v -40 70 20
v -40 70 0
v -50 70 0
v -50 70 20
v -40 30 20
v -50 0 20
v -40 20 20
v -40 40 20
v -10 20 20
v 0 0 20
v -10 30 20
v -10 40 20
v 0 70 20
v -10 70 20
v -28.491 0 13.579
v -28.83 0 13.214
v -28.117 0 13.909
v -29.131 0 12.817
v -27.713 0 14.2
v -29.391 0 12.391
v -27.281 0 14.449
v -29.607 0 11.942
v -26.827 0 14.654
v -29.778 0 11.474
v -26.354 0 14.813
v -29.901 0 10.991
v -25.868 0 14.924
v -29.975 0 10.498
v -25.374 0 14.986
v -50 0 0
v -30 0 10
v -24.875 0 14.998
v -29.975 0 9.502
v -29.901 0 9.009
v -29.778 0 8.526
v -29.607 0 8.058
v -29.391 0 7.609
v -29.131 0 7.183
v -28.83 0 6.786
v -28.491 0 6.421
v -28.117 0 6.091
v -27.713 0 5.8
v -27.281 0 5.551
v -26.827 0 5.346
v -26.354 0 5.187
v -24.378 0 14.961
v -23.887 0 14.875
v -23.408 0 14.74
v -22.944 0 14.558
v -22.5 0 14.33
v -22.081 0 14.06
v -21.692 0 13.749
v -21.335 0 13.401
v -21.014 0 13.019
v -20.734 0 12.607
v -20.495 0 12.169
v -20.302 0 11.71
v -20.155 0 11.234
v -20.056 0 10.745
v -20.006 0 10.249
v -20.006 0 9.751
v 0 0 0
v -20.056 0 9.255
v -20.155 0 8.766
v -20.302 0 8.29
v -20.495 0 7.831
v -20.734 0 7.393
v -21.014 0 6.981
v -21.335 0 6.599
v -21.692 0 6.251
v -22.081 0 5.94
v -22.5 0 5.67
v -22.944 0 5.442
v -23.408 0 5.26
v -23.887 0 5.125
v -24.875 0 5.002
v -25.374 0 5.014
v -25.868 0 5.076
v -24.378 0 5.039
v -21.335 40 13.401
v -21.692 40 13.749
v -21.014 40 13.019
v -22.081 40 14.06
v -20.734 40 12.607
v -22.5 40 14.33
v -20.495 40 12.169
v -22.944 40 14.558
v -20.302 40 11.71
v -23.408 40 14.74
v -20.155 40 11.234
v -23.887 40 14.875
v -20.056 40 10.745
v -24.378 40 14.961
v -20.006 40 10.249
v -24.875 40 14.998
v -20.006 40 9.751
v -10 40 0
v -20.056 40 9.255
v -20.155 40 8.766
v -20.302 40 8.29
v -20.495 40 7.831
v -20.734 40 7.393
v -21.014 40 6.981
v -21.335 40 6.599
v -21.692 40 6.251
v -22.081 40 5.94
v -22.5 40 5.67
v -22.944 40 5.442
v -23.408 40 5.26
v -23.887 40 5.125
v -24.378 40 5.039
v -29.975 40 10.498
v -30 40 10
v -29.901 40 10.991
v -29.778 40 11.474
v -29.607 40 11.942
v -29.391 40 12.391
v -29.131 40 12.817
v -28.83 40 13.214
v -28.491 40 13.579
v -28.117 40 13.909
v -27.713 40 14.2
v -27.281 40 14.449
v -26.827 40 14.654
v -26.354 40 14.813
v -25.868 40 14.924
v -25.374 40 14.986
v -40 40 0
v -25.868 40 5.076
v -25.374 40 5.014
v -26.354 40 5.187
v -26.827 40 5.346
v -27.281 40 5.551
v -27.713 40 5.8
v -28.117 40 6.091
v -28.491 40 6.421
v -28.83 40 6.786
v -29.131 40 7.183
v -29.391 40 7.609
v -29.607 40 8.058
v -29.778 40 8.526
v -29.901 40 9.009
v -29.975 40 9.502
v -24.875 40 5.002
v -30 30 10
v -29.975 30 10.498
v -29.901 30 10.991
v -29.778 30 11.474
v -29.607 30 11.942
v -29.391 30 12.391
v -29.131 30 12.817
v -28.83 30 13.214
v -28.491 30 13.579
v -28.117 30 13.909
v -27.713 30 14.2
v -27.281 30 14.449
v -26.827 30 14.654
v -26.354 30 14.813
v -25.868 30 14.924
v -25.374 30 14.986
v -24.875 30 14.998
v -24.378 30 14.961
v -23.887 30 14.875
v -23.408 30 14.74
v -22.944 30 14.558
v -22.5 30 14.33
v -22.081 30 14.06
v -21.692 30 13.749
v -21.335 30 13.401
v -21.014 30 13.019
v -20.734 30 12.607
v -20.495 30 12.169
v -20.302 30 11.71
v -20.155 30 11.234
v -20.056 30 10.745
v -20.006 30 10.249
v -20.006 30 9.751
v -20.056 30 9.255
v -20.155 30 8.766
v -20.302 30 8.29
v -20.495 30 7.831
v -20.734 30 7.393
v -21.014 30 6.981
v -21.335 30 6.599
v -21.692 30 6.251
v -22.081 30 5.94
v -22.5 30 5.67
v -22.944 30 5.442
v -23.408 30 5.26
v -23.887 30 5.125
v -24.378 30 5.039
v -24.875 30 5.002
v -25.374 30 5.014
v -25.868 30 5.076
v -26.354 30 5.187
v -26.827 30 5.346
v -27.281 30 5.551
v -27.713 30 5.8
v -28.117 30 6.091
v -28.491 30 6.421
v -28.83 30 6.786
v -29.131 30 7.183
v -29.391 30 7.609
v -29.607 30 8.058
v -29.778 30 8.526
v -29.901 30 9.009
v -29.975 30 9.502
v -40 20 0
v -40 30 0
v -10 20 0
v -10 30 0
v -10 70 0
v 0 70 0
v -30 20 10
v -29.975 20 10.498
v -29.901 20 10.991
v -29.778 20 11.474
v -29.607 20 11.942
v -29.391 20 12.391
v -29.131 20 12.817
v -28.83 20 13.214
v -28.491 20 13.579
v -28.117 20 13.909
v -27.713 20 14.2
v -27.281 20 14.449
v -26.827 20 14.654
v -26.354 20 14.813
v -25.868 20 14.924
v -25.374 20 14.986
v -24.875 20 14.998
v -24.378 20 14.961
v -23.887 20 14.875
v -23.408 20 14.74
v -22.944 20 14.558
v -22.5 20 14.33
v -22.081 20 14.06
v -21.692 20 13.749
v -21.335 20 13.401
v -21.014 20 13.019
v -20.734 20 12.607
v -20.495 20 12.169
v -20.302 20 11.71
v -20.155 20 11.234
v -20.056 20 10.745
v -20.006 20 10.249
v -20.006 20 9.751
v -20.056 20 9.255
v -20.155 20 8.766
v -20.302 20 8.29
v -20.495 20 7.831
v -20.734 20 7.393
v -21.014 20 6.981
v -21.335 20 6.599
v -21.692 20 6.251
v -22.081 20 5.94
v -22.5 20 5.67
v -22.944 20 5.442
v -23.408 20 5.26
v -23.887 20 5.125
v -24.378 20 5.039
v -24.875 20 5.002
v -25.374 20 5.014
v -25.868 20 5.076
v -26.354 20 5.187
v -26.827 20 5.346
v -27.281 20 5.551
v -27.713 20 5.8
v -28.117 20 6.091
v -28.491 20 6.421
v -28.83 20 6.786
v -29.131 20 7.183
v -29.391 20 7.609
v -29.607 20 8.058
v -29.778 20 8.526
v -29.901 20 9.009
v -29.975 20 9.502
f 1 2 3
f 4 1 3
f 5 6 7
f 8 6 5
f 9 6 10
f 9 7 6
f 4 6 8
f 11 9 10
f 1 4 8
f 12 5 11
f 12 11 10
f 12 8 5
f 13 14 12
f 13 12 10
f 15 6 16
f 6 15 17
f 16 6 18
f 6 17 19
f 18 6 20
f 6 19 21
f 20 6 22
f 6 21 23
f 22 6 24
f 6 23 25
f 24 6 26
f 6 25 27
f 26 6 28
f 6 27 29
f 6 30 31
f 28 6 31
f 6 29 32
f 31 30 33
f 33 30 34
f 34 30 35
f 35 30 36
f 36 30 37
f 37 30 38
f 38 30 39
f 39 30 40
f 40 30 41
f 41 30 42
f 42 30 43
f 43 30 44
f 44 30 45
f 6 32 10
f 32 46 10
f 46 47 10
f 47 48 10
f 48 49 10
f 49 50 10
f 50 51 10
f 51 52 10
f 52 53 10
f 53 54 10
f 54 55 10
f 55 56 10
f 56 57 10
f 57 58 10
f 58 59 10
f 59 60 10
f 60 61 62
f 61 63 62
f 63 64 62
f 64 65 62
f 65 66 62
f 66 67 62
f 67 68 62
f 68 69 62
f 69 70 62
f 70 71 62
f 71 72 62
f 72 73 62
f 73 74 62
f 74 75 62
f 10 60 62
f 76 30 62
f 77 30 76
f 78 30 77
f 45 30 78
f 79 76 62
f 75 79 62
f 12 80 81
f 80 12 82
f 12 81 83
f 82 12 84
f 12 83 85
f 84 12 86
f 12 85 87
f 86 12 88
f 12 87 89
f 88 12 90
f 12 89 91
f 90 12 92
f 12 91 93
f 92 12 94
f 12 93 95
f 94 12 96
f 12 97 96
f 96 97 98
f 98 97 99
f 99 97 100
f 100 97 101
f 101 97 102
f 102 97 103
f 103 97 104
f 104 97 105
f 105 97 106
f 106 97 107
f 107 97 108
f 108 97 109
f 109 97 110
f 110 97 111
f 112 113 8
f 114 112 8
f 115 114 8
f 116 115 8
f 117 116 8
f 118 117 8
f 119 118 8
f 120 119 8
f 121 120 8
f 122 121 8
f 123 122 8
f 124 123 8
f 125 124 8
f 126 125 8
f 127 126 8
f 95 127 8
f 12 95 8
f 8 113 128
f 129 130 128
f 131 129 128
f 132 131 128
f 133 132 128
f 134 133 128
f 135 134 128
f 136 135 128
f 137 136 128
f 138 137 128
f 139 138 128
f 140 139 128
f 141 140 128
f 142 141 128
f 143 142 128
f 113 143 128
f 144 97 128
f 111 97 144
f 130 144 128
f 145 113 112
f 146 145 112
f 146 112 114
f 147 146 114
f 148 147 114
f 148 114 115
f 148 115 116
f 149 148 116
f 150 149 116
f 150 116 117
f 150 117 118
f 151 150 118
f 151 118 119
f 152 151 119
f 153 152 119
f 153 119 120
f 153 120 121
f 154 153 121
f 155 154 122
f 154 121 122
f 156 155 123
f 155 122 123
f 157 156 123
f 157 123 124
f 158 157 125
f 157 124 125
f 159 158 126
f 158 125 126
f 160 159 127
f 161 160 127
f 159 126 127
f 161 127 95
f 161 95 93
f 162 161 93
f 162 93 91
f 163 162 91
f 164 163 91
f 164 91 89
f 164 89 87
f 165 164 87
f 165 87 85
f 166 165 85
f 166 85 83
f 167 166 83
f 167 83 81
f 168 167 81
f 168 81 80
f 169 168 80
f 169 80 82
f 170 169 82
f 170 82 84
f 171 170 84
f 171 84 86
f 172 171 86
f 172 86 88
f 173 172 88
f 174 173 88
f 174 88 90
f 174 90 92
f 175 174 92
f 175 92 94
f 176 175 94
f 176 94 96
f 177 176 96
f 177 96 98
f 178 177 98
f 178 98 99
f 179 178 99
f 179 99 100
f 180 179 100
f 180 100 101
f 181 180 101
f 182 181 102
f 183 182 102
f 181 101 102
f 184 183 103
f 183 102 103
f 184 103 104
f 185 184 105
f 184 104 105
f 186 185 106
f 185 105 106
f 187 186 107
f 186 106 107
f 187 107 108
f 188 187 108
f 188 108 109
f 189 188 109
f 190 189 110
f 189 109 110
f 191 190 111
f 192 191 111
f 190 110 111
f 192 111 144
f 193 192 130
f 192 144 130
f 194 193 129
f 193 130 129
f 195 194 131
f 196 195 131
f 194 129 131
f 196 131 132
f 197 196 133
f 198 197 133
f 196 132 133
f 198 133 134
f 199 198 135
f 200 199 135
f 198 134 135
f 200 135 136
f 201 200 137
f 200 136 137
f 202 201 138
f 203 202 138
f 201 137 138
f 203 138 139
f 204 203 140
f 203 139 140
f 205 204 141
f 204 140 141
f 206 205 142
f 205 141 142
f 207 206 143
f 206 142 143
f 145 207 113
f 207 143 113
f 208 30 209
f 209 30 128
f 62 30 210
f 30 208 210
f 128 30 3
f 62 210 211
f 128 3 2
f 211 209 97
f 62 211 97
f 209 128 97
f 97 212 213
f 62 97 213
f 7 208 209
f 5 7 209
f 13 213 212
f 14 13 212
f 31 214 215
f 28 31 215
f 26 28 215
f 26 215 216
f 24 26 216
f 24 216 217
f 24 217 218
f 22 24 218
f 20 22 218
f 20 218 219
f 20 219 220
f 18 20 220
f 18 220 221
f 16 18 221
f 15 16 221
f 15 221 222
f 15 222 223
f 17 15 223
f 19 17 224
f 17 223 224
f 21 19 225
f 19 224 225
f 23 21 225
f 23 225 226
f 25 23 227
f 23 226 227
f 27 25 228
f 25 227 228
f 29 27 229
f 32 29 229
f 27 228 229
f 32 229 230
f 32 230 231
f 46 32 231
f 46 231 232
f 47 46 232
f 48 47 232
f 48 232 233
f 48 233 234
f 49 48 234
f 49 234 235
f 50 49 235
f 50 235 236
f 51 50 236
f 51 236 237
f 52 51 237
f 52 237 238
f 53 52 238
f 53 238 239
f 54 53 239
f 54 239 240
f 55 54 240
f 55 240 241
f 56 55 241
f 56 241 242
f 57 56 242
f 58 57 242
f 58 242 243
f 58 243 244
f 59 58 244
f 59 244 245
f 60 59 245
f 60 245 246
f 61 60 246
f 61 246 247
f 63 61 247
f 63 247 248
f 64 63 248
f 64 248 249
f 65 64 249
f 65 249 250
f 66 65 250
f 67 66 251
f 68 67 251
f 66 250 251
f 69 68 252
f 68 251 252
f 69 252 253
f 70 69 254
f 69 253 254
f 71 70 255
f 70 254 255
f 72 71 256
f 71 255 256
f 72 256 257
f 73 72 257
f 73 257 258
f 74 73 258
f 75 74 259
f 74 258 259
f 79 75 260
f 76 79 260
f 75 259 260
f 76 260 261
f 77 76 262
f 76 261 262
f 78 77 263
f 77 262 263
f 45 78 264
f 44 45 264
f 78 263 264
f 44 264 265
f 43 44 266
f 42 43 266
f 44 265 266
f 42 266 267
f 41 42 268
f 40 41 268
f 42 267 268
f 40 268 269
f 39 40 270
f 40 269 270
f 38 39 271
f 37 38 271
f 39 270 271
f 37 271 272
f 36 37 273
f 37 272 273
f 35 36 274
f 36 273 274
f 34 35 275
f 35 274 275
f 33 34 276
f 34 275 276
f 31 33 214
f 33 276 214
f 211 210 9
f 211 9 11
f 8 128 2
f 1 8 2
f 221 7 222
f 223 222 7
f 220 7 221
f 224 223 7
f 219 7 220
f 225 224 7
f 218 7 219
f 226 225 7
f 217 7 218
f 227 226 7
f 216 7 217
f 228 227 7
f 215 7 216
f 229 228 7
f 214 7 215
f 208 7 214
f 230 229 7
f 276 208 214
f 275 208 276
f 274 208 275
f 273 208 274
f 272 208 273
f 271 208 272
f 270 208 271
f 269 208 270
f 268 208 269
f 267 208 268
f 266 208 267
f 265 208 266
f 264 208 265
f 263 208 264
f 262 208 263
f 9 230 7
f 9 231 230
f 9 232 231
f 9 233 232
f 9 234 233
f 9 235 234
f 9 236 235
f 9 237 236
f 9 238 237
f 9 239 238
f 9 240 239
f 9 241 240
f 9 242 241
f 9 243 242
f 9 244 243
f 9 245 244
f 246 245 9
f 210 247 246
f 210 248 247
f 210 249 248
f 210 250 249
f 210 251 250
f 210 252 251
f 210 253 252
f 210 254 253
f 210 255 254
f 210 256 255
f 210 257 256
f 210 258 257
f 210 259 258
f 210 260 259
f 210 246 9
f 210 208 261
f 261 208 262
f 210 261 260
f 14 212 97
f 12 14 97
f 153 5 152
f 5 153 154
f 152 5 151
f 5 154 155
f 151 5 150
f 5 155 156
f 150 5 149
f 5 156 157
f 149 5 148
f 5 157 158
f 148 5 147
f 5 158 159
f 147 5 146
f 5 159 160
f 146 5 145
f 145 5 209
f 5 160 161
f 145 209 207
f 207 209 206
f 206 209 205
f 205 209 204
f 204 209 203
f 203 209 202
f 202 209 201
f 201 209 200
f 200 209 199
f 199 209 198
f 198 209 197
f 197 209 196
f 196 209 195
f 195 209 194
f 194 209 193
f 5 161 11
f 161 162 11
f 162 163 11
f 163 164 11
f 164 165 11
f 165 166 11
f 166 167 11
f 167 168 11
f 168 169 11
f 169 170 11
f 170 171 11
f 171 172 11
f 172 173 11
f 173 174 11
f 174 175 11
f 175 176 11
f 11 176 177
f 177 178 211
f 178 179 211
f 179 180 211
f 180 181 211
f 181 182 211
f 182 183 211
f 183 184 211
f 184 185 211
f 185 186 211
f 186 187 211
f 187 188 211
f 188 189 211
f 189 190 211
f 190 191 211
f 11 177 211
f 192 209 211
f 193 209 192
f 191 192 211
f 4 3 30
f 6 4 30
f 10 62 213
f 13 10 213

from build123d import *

# Parameters (mm, degrees)
ESBO_O1_W                = 30
ESBO_O1_H                = 10
RESSALTO_EXTRUS_O1_DEPTH = 20
ESBO_O2_R                = 5
CORTE_EXTRUS_O1_DEPTH    = 41


with BuildPart() as part:
    # Esboço1 → Ressalto-extrusão1 (new body)
    with BuildSketch(Plane.XY):
        Polygon((-40, 70), (-50, 70), (-50, 0), (0, 0), (0, 70), (-10, 70), (-10, 40), (-40, 40), align=None)
        with Locations((-25, 25)):
            Rectangle(ESBO_O1_W, ESBO_O1_H, mode=Mode.SUBTRACT)
    extrude(amount=RESSALTO_EXTRUS_O1_DEPTH)

    # Esboço2 → Corte-extrusão1 (cut, through all)
    with BuildSketch(Plane(origin=(0, 40, 0), x_dir=(1, 0, 0), z_dir=(0, 1, 0))):
        with Locations(Location((-25, -10, 0), (0, 0, 180))):  # turned: the seam where the file's is
            Circle(ESBO_O2_R)
    extrude(amount=-CORTE_EXTRUS_O1_DEPTH, mode=Mode.SUBTRACT)


solid = part.part
